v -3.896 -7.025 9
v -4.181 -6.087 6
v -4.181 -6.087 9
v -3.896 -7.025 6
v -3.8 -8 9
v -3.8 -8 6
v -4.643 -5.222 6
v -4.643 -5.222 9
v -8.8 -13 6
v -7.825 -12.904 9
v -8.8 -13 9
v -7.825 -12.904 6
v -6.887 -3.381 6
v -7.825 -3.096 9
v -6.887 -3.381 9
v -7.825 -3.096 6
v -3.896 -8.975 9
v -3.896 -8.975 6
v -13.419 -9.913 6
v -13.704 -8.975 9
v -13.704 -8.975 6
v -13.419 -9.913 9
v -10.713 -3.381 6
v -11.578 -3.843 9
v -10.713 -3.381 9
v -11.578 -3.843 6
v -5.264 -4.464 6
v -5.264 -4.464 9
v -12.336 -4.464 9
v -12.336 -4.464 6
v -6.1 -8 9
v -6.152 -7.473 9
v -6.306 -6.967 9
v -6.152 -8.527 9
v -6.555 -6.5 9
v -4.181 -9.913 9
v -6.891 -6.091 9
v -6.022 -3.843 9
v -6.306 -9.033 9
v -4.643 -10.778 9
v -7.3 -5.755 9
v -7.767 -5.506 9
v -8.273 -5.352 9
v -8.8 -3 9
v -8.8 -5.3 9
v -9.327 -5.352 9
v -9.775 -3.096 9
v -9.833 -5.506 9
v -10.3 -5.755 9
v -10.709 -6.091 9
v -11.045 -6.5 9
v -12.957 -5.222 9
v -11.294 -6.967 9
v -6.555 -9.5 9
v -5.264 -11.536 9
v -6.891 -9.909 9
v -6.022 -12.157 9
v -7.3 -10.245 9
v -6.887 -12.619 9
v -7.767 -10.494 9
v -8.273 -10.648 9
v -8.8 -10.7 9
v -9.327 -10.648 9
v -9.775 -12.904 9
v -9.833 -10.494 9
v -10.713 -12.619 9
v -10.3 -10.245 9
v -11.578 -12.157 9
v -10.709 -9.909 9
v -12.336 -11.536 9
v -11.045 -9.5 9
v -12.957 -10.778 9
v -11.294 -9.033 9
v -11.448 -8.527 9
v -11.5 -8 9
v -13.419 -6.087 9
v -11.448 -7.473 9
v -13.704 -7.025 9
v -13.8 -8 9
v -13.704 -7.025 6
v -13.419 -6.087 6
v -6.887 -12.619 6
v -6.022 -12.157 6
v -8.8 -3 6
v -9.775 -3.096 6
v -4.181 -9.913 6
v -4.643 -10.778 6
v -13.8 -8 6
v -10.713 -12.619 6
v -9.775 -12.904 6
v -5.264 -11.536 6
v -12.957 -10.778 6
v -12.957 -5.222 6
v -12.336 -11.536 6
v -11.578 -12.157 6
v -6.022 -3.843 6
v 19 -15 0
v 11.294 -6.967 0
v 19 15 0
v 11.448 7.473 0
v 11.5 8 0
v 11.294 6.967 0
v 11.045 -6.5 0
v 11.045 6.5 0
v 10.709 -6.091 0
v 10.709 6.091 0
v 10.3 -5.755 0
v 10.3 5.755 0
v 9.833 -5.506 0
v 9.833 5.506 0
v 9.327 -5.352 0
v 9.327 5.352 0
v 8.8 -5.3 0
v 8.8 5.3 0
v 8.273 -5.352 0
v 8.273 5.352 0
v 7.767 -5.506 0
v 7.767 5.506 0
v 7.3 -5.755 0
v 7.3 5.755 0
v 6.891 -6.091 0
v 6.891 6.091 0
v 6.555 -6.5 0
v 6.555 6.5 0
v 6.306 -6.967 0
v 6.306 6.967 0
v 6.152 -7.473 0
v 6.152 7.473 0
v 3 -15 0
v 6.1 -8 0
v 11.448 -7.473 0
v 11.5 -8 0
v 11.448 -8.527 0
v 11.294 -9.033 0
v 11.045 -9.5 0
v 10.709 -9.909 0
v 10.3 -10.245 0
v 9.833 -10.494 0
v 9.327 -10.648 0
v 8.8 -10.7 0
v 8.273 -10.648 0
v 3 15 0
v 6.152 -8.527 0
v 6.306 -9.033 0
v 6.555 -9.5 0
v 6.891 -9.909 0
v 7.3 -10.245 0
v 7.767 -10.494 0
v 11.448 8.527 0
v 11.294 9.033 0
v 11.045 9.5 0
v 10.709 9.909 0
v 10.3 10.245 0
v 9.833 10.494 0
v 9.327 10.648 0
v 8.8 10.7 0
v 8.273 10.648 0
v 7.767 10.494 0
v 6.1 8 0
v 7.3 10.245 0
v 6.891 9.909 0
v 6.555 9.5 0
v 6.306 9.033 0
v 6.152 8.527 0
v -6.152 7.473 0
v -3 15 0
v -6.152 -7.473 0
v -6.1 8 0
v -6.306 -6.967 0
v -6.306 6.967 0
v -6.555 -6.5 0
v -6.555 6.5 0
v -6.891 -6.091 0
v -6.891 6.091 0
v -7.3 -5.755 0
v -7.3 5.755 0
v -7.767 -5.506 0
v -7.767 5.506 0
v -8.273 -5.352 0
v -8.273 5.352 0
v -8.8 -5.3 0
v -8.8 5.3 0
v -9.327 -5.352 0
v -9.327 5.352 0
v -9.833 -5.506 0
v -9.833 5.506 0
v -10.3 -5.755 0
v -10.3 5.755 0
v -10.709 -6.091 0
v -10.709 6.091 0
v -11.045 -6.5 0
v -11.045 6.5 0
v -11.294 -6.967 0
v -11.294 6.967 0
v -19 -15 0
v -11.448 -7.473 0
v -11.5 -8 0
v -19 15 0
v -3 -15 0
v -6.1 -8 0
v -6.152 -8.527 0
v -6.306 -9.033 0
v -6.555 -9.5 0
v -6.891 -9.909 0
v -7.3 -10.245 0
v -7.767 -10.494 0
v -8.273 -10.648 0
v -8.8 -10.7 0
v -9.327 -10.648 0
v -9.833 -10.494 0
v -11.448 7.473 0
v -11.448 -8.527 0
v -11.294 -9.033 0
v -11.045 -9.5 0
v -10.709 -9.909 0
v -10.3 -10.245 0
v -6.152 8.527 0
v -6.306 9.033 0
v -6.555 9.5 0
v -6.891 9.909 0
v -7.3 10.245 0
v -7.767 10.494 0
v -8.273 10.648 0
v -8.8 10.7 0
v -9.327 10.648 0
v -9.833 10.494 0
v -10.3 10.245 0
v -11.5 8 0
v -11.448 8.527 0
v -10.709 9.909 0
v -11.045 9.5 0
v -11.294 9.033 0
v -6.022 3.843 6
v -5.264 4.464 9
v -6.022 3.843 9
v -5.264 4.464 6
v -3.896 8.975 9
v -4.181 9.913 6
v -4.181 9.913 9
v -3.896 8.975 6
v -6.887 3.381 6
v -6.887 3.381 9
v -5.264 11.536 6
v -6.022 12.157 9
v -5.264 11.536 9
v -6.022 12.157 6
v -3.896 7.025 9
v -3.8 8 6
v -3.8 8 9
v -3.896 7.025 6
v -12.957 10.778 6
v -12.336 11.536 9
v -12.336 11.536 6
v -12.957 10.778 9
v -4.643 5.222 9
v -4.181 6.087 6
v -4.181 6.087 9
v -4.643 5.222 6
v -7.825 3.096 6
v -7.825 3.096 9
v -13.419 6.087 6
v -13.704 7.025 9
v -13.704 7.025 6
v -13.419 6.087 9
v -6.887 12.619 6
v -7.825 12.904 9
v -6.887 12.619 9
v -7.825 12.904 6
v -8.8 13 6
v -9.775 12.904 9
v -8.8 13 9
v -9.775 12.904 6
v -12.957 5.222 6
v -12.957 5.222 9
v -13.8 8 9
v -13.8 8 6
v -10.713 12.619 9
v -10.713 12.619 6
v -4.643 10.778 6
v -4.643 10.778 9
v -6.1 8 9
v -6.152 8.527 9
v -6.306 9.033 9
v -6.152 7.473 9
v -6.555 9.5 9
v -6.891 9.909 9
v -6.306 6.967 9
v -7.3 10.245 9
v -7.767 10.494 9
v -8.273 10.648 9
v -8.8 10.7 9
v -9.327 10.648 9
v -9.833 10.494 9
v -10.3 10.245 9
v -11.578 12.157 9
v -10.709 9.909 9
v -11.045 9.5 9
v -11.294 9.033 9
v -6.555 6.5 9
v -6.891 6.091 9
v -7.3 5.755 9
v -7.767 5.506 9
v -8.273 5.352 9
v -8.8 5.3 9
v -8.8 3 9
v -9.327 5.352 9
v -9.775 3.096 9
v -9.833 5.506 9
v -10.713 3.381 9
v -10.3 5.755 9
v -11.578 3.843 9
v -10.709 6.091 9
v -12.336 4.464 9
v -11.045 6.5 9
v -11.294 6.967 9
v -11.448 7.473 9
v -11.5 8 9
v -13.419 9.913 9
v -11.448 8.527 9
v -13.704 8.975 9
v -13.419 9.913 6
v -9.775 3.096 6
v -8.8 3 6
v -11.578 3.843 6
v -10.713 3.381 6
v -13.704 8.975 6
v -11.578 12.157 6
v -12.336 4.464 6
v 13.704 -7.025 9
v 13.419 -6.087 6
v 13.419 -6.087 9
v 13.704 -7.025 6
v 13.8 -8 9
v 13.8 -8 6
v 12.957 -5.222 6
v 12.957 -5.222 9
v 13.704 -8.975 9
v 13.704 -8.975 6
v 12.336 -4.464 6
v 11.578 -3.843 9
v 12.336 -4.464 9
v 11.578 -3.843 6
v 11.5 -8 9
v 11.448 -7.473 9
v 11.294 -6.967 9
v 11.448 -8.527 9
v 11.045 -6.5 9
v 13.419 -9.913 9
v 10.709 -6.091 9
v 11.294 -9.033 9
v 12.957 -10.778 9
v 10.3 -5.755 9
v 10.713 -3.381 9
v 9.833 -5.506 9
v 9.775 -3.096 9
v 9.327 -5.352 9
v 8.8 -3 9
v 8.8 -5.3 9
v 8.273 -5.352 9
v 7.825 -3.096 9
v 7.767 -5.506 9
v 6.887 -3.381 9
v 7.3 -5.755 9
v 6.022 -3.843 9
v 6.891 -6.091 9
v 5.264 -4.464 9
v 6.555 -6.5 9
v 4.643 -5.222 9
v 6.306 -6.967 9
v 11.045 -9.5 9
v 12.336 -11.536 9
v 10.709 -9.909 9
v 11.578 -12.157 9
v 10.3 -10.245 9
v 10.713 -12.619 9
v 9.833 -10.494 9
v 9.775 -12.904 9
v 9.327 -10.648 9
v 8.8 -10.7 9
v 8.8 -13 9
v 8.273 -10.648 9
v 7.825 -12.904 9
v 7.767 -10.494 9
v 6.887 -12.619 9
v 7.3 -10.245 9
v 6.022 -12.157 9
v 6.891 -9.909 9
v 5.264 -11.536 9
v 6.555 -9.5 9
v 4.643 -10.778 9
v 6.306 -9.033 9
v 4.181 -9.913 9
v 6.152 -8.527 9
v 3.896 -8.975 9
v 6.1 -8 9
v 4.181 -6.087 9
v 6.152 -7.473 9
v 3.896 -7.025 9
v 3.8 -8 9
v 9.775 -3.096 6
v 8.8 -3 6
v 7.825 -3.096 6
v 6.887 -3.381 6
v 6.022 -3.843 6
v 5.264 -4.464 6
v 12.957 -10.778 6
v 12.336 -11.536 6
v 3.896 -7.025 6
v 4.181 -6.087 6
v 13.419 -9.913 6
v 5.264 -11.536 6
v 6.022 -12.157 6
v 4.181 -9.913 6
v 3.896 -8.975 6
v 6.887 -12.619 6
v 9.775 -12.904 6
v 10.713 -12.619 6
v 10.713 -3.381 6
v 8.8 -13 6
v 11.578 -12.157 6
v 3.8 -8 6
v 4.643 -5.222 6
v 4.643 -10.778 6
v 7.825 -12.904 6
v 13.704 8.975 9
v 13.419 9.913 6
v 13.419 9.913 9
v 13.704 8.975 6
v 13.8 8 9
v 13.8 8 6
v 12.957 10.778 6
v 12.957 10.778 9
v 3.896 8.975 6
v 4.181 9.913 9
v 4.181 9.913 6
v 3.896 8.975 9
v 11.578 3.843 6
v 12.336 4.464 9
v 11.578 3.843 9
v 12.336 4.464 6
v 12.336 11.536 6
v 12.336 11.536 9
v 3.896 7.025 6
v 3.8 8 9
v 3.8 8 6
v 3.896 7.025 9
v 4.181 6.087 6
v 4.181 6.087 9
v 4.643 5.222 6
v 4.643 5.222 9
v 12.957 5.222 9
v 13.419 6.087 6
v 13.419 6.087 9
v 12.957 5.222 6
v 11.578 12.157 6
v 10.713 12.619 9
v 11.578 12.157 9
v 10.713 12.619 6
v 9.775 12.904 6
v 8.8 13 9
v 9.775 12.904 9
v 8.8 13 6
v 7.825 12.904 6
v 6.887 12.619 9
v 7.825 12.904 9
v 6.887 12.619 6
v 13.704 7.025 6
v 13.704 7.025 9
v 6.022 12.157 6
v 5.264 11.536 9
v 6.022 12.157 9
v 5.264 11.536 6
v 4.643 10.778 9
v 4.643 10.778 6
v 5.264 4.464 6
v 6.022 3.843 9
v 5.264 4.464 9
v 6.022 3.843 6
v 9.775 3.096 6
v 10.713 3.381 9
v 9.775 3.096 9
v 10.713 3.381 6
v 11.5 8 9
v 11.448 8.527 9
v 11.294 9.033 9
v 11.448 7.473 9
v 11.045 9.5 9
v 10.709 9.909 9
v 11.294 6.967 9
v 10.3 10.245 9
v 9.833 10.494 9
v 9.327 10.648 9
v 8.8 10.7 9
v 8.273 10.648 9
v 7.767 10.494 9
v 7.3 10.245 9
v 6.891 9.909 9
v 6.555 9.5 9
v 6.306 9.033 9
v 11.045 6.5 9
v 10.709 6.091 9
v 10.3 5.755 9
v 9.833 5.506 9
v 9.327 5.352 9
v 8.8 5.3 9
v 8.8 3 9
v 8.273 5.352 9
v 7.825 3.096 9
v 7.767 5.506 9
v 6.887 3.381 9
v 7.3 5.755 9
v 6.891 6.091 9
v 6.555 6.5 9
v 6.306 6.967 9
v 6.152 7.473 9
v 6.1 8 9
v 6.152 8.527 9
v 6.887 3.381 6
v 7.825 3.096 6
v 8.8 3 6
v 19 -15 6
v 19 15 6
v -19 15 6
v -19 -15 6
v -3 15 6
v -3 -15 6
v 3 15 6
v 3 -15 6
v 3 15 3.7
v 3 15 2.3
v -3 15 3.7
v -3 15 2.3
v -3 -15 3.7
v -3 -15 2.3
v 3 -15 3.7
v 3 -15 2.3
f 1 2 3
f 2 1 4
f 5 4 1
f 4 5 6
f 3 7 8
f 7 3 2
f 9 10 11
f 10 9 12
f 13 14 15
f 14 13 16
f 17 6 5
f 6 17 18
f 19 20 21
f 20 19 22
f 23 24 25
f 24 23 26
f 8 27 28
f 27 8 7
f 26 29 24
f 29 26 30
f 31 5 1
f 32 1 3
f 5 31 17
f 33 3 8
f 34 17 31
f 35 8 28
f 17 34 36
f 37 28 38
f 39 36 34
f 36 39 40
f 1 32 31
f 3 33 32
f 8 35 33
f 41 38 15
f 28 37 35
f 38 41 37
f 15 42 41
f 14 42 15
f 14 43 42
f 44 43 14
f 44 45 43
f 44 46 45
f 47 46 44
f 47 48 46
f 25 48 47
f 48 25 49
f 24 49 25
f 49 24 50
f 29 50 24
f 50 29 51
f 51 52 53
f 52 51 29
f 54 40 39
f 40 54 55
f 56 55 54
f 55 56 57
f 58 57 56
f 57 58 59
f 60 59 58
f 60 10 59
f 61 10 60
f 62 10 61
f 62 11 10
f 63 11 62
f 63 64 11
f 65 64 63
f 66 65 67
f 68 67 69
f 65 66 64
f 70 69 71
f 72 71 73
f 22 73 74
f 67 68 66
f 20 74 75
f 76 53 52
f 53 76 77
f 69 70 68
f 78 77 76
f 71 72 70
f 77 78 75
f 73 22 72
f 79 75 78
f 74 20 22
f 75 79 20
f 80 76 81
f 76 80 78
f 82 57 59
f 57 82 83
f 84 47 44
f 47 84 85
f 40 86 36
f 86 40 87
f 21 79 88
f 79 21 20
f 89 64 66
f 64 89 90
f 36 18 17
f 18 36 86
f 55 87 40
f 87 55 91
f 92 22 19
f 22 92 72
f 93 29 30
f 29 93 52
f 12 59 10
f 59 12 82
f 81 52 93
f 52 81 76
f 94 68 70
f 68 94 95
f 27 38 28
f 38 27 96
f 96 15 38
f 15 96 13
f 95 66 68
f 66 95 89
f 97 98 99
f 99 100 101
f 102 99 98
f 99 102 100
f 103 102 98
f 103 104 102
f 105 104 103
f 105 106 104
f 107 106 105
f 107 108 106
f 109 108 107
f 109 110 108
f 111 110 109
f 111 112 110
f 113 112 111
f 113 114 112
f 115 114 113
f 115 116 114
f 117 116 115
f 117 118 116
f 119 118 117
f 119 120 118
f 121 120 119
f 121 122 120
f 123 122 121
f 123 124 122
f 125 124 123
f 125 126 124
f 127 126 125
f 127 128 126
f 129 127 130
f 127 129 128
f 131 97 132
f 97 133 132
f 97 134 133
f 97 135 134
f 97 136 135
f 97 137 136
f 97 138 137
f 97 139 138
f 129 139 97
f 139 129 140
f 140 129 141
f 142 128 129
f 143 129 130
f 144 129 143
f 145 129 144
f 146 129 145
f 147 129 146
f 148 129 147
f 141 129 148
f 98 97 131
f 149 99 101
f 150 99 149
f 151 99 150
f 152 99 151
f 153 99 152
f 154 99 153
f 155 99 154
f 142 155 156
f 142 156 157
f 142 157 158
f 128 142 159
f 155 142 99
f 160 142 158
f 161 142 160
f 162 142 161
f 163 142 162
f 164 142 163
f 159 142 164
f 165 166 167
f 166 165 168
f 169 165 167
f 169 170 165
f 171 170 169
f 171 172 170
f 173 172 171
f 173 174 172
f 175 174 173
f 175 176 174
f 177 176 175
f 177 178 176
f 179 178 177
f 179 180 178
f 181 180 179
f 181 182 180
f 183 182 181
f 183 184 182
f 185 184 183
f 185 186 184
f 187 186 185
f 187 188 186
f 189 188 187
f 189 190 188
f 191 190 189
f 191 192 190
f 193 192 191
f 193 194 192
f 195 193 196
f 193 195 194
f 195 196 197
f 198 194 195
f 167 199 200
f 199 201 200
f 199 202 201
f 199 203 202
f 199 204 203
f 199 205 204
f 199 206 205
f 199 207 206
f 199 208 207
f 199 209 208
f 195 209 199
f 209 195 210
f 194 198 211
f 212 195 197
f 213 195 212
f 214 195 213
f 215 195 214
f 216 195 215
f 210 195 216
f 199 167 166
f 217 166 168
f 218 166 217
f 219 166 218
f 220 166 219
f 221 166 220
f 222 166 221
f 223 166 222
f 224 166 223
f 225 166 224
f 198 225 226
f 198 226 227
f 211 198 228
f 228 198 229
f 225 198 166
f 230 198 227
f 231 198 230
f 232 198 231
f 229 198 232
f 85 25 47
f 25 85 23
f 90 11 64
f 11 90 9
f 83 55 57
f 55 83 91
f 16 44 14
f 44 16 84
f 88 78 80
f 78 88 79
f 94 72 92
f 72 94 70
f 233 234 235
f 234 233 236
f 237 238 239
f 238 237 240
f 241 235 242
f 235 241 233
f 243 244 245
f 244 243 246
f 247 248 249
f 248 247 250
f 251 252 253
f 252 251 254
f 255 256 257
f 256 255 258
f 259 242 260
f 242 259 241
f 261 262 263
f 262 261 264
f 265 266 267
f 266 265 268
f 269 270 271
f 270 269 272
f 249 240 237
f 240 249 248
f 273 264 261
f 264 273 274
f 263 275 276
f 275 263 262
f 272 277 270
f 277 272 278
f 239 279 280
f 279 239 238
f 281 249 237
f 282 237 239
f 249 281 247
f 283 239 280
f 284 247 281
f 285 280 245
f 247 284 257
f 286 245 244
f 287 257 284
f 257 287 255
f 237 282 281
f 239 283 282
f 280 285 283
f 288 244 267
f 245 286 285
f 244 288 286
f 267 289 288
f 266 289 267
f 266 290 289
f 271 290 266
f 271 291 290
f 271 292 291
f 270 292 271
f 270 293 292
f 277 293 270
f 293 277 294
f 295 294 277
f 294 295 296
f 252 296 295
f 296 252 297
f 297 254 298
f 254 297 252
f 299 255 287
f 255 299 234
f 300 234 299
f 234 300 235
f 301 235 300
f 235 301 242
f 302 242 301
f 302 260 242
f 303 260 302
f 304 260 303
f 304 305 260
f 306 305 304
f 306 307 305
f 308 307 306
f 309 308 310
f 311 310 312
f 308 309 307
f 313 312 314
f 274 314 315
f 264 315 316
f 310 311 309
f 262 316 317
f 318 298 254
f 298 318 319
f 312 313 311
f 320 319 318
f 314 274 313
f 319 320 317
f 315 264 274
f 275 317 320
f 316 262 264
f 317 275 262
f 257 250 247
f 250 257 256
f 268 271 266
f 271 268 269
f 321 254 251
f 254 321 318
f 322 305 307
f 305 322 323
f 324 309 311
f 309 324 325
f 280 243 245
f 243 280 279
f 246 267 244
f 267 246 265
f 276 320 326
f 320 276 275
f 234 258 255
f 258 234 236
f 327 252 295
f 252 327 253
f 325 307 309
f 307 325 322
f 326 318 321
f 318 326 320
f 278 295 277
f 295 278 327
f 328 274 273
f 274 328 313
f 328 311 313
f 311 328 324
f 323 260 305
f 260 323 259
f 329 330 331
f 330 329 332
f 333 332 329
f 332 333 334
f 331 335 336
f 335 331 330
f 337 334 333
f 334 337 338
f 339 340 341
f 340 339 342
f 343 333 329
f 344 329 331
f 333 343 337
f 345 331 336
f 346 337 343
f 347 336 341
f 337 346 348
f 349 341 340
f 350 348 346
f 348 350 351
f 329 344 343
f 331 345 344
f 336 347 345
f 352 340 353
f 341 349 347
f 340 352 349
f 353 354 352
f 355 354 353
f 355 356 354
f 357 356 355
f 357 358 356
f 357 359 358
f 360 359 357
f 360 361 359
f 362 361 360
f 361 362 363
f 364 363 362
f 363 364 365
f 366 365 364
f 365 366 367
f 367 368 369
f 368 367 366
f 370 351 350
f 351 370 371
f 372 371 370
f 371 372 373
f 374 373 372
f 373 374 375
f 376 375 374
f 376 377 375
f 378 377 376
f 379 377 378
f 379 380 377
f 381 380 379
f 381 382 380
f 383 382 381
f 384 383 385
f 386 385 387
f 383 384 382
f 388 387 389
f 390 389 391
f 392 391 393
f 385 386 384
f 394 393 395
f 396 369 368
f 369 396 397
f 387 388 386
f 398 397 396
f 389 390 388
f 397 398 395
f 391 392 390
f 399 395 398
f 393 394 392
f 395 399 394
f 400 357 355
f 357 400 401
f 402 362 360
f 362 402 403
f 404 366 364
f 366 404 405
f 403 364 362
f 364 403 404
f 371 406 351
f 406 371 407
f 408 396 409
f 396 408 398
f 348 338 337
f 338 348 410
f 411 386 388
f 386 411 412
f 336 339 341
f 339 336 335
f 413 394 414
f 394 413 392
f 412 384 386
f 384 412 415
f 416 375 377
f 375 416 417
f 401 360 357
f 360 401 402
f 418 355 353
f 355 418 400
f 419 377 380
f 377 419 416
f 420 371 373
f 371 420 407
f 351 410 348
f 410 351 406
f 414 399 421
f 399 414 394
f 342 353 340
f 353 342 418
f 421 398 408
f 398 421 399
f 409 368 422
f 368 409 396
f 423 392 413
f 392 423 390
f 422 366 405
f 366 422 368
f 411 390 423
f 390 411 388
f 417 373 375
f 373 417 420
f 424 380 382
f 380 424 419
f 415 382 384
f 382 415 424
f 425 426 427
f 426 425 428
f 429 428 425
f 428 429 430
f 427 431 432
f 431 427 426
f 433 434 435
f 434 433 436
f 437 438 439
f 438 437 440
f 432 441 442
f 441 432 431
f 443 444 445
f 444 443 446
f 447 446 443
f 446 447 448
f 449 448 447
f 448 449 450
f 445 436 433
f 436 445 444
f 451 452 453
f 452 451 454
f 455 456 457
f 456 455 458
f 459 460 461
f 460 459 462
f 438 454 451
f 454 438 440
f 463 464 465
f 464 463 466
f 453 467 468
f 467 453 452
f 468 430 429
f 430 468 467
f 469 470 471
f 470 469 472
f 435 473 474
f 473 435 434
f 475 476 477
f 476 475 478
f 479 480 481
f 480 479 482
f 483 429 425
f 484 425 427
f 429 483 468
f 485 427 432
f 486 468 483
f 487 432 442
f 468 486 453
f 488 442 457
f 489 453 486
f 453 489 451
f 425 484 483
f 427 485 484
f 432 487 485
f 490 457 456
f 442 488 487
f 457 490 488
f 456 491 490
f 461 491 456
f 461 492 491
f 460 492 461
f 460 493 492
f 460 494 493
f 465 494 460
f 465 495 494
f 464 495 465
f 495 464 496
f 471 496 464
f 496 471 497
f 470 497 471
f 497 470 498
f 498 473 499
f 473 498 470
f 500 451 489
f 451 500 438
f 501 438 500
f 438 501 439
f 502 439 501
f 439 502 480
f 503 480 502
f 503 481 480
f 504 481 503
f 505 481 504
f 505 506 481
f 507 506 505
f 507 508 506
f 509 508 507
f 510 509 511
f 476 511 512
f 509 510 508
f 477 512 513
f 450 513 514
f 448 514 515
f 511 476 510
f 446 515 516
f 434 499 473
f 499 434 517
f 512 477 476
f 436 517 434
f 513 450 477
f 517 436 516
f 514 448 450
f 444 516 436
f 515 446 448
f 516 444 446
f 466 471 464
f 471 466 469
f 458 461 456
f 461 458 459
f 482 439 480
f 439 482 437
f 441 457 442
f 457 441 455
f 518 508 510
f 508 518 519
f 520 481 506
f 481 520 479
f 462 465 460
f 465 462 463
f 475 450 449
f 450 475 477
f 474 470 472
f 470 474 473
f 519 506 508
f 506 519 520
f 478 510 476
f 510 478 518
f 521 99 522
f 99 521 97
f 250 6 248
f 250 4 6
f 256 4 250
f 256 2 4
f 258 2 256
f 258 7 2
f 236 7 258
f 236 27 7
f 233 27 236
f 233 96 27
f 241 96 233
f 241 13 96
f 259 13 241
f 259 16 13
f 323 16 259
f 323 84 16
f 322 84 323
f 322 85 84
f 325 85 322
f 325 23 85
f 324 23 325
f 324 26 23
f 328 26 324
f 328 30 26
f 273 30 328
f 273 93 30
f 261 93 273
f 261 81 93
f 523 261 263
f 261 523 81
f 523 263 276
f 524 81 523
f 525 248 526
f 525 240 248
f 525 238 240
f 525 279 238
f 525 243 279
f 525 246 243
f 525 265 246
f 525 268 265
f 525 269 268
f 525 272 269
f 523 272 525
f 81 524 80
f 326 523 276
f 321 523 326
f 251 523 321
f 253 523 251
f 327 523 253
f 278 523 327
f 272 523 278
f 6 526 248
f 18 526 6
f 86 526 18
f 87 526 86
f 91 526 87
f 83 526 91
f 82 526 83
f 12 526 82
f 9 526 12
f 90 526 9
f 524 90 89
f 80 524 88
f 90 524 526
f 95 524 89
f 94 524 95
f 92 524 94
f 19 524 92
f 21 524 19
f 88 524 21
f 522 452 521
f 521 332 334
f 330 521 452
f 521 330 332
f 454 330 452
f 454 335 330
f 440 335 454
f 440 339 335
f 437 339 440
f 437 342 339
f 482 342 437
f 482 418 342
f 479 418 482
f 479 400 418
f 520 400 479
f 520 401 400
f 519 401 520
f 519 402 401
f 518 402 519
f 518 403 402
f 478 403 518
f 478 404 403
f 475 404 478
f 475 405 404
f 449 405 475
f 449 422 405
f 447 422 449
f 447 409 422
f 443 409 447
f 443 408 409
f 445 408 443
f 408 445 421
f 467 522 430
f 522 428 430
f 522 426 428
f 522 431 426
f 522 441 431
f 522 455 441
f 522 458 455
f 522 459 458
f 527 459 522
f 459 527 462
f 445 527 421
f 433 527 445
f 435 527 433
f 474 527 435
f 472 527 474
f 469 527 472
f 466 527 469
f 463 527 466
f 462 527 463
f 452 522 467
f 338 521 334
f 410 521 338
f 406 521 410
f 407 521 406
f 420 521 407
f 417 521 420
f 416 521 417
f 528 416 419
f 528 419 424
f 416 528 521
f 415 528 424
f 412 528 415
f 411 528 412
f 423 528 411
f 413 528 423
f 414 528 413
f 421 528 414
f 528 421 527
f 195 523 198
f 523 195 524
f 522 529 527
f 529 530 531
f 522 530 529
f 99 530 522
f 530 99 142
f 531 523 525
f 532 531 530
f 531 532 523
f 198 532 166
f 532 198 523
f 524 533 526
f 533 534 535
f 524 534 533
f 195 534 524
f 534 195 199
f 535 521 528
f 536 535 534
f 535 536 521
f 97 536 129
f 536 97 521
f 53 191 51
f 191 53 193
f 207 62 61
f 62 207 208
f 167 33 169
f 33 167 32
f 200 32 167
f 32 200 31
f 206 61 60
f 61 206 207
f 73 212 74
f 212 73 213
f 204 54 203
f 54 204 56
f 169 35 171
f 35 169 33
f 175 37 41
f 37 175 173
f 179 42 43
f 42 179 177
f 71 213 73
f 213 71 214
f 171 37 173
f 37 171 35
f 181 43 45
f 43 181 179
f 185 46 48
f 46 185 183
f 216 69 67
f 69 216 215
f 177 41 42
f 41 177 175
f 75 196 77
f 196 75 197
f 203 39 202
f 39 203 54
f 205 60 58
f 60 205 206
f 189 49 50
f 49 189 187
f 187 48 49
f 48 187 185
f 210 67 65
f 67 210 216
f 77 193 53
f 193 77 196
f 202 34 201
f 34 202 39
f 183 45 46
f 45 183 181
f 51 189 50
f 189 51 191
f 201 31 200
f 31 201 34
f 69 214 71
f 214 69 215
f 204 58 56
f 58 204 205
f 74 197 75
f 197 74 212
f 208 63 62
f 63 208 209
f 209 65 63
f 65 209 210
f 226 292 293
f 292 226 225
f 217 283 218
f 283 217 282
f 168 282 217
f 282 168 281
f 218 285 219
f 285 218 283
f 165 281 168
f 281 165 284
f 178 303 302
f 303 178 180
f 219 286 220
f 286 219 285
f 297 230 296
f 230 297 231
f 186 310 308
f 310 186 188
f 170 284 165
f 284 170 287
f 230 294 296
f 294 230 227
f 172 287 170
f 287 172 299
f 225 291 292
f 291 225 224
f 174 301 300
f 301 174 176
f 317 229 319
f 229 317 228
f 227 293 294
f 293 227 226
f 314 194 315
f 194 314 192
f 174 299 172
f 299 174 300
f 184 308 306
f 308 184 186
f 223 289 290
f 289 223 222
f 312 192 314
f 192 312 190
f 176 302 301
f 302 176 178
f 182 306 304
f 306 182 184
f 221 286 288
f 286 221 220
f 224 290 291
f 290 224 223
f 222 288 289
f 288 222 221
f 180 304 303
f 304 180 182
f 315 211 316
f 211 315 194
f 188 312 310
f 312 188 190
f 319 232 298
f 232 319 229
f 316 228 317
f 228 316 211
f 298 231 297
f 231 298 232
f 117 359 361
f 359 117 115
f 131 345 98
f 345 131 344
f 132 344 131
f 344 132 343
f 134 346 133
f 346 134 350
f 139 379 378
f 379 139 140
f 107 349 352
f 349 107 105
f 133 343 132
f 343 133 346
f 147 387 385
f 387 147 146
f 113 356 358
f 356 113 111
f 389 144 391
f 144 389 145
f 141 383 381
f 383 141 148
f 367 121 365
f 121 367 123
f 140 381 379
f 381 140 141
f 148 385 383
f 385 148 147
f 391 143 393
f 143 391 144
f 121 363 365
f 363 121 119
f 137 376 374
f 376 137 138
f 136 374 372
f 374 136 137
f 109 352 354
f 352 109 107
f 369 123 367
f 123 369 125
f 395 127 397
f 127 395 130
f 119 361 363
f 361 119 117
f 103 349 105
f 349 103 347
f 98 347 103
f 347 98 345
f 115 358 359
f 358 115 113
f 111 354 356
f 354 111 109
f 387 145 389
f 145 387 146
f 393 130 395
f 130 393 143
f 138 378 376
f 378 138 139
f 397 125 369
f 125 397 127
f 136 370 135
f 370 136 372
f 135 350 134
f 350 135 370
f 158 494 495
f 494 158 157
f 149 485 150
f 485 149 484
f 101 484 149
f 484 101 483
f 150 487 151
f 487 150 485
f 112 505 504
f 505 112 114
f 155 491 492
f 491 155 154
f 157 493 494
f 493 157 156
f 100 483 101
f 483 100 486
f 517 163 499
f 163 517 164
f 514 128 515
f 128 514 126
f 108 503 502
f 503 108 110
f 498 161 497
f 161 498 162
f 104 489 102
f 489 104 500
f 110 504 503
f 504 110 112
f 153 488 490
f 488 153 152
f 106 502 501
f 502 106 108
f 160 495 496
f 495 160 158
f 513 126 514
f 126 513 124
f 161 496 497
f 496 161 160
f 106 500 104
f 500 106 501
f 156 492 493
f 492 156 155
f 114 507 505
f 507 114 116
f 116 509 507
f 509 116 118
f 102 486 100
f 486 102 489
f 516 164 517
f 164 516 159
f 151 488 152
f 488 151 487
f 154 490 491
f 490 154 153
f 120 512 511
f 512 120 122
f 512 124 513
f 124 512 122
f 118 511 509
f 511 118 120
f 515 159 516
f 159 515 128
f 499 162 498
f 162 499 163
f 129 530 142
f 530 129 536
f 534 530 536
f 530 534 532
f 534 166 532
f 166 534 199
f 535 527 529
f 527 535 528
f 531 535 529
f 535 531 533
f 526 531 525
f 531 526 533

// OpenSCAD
$fn = 32;

// ----------------------------------------------------------------------
// Living hinge: 38 x 30 mm plates, 1.4 mm flexible web
// ----------------------------------------------------------------------

// --- parameters (mm) ---
plate_len = 16;           // plate length outside the web
plate_w = 30;             // plate width
thick = 6;                // plate thickness
web_half = 3;             // half width of the flex band
web_t = 1.4;              // flexible web thickness
web_z = 2.3;              // web position inside the thickness
boss_d = 10;              // screw boss diameter
boss_h = 9;               // screw boss height
boss_x = 8.8;             // screw boss distance from the web
screw_d = 5.4;            // screw hole

difference() {
  union() {
    /* one flat strip, later thinned at the middle */
    translate([-19, -15, 0]) cube([38, 30, 6]);
    /* screw bosses, sunk 0.5 mm into the plates */
    for (sx = [-8.8, 8.8]) {
      for (sy = [-8, 8]) {
        translate([sx, sy, 0]) cylinder(h = boss_h, d = boss_d);
      }
    }
  }
  /* channel from below: leaves the web on top of it */
  translate([-3, -17.5, -2.5]) cube([6, 35, 4.8]);
  /* channel from above: thins the web down to web_t */
  translate([-3, -17.5, 3.7]) cube([6, 35, 4.8]);
  /* screw holes through the bosses */
  for (sx = [-8.8, 8.8]) {
    for (sy = [-8, 8]) {
      translate([sx, sy, -2.5]) cylinder(h = boss_h + 5, d = screw_d);
    }
  }
}
